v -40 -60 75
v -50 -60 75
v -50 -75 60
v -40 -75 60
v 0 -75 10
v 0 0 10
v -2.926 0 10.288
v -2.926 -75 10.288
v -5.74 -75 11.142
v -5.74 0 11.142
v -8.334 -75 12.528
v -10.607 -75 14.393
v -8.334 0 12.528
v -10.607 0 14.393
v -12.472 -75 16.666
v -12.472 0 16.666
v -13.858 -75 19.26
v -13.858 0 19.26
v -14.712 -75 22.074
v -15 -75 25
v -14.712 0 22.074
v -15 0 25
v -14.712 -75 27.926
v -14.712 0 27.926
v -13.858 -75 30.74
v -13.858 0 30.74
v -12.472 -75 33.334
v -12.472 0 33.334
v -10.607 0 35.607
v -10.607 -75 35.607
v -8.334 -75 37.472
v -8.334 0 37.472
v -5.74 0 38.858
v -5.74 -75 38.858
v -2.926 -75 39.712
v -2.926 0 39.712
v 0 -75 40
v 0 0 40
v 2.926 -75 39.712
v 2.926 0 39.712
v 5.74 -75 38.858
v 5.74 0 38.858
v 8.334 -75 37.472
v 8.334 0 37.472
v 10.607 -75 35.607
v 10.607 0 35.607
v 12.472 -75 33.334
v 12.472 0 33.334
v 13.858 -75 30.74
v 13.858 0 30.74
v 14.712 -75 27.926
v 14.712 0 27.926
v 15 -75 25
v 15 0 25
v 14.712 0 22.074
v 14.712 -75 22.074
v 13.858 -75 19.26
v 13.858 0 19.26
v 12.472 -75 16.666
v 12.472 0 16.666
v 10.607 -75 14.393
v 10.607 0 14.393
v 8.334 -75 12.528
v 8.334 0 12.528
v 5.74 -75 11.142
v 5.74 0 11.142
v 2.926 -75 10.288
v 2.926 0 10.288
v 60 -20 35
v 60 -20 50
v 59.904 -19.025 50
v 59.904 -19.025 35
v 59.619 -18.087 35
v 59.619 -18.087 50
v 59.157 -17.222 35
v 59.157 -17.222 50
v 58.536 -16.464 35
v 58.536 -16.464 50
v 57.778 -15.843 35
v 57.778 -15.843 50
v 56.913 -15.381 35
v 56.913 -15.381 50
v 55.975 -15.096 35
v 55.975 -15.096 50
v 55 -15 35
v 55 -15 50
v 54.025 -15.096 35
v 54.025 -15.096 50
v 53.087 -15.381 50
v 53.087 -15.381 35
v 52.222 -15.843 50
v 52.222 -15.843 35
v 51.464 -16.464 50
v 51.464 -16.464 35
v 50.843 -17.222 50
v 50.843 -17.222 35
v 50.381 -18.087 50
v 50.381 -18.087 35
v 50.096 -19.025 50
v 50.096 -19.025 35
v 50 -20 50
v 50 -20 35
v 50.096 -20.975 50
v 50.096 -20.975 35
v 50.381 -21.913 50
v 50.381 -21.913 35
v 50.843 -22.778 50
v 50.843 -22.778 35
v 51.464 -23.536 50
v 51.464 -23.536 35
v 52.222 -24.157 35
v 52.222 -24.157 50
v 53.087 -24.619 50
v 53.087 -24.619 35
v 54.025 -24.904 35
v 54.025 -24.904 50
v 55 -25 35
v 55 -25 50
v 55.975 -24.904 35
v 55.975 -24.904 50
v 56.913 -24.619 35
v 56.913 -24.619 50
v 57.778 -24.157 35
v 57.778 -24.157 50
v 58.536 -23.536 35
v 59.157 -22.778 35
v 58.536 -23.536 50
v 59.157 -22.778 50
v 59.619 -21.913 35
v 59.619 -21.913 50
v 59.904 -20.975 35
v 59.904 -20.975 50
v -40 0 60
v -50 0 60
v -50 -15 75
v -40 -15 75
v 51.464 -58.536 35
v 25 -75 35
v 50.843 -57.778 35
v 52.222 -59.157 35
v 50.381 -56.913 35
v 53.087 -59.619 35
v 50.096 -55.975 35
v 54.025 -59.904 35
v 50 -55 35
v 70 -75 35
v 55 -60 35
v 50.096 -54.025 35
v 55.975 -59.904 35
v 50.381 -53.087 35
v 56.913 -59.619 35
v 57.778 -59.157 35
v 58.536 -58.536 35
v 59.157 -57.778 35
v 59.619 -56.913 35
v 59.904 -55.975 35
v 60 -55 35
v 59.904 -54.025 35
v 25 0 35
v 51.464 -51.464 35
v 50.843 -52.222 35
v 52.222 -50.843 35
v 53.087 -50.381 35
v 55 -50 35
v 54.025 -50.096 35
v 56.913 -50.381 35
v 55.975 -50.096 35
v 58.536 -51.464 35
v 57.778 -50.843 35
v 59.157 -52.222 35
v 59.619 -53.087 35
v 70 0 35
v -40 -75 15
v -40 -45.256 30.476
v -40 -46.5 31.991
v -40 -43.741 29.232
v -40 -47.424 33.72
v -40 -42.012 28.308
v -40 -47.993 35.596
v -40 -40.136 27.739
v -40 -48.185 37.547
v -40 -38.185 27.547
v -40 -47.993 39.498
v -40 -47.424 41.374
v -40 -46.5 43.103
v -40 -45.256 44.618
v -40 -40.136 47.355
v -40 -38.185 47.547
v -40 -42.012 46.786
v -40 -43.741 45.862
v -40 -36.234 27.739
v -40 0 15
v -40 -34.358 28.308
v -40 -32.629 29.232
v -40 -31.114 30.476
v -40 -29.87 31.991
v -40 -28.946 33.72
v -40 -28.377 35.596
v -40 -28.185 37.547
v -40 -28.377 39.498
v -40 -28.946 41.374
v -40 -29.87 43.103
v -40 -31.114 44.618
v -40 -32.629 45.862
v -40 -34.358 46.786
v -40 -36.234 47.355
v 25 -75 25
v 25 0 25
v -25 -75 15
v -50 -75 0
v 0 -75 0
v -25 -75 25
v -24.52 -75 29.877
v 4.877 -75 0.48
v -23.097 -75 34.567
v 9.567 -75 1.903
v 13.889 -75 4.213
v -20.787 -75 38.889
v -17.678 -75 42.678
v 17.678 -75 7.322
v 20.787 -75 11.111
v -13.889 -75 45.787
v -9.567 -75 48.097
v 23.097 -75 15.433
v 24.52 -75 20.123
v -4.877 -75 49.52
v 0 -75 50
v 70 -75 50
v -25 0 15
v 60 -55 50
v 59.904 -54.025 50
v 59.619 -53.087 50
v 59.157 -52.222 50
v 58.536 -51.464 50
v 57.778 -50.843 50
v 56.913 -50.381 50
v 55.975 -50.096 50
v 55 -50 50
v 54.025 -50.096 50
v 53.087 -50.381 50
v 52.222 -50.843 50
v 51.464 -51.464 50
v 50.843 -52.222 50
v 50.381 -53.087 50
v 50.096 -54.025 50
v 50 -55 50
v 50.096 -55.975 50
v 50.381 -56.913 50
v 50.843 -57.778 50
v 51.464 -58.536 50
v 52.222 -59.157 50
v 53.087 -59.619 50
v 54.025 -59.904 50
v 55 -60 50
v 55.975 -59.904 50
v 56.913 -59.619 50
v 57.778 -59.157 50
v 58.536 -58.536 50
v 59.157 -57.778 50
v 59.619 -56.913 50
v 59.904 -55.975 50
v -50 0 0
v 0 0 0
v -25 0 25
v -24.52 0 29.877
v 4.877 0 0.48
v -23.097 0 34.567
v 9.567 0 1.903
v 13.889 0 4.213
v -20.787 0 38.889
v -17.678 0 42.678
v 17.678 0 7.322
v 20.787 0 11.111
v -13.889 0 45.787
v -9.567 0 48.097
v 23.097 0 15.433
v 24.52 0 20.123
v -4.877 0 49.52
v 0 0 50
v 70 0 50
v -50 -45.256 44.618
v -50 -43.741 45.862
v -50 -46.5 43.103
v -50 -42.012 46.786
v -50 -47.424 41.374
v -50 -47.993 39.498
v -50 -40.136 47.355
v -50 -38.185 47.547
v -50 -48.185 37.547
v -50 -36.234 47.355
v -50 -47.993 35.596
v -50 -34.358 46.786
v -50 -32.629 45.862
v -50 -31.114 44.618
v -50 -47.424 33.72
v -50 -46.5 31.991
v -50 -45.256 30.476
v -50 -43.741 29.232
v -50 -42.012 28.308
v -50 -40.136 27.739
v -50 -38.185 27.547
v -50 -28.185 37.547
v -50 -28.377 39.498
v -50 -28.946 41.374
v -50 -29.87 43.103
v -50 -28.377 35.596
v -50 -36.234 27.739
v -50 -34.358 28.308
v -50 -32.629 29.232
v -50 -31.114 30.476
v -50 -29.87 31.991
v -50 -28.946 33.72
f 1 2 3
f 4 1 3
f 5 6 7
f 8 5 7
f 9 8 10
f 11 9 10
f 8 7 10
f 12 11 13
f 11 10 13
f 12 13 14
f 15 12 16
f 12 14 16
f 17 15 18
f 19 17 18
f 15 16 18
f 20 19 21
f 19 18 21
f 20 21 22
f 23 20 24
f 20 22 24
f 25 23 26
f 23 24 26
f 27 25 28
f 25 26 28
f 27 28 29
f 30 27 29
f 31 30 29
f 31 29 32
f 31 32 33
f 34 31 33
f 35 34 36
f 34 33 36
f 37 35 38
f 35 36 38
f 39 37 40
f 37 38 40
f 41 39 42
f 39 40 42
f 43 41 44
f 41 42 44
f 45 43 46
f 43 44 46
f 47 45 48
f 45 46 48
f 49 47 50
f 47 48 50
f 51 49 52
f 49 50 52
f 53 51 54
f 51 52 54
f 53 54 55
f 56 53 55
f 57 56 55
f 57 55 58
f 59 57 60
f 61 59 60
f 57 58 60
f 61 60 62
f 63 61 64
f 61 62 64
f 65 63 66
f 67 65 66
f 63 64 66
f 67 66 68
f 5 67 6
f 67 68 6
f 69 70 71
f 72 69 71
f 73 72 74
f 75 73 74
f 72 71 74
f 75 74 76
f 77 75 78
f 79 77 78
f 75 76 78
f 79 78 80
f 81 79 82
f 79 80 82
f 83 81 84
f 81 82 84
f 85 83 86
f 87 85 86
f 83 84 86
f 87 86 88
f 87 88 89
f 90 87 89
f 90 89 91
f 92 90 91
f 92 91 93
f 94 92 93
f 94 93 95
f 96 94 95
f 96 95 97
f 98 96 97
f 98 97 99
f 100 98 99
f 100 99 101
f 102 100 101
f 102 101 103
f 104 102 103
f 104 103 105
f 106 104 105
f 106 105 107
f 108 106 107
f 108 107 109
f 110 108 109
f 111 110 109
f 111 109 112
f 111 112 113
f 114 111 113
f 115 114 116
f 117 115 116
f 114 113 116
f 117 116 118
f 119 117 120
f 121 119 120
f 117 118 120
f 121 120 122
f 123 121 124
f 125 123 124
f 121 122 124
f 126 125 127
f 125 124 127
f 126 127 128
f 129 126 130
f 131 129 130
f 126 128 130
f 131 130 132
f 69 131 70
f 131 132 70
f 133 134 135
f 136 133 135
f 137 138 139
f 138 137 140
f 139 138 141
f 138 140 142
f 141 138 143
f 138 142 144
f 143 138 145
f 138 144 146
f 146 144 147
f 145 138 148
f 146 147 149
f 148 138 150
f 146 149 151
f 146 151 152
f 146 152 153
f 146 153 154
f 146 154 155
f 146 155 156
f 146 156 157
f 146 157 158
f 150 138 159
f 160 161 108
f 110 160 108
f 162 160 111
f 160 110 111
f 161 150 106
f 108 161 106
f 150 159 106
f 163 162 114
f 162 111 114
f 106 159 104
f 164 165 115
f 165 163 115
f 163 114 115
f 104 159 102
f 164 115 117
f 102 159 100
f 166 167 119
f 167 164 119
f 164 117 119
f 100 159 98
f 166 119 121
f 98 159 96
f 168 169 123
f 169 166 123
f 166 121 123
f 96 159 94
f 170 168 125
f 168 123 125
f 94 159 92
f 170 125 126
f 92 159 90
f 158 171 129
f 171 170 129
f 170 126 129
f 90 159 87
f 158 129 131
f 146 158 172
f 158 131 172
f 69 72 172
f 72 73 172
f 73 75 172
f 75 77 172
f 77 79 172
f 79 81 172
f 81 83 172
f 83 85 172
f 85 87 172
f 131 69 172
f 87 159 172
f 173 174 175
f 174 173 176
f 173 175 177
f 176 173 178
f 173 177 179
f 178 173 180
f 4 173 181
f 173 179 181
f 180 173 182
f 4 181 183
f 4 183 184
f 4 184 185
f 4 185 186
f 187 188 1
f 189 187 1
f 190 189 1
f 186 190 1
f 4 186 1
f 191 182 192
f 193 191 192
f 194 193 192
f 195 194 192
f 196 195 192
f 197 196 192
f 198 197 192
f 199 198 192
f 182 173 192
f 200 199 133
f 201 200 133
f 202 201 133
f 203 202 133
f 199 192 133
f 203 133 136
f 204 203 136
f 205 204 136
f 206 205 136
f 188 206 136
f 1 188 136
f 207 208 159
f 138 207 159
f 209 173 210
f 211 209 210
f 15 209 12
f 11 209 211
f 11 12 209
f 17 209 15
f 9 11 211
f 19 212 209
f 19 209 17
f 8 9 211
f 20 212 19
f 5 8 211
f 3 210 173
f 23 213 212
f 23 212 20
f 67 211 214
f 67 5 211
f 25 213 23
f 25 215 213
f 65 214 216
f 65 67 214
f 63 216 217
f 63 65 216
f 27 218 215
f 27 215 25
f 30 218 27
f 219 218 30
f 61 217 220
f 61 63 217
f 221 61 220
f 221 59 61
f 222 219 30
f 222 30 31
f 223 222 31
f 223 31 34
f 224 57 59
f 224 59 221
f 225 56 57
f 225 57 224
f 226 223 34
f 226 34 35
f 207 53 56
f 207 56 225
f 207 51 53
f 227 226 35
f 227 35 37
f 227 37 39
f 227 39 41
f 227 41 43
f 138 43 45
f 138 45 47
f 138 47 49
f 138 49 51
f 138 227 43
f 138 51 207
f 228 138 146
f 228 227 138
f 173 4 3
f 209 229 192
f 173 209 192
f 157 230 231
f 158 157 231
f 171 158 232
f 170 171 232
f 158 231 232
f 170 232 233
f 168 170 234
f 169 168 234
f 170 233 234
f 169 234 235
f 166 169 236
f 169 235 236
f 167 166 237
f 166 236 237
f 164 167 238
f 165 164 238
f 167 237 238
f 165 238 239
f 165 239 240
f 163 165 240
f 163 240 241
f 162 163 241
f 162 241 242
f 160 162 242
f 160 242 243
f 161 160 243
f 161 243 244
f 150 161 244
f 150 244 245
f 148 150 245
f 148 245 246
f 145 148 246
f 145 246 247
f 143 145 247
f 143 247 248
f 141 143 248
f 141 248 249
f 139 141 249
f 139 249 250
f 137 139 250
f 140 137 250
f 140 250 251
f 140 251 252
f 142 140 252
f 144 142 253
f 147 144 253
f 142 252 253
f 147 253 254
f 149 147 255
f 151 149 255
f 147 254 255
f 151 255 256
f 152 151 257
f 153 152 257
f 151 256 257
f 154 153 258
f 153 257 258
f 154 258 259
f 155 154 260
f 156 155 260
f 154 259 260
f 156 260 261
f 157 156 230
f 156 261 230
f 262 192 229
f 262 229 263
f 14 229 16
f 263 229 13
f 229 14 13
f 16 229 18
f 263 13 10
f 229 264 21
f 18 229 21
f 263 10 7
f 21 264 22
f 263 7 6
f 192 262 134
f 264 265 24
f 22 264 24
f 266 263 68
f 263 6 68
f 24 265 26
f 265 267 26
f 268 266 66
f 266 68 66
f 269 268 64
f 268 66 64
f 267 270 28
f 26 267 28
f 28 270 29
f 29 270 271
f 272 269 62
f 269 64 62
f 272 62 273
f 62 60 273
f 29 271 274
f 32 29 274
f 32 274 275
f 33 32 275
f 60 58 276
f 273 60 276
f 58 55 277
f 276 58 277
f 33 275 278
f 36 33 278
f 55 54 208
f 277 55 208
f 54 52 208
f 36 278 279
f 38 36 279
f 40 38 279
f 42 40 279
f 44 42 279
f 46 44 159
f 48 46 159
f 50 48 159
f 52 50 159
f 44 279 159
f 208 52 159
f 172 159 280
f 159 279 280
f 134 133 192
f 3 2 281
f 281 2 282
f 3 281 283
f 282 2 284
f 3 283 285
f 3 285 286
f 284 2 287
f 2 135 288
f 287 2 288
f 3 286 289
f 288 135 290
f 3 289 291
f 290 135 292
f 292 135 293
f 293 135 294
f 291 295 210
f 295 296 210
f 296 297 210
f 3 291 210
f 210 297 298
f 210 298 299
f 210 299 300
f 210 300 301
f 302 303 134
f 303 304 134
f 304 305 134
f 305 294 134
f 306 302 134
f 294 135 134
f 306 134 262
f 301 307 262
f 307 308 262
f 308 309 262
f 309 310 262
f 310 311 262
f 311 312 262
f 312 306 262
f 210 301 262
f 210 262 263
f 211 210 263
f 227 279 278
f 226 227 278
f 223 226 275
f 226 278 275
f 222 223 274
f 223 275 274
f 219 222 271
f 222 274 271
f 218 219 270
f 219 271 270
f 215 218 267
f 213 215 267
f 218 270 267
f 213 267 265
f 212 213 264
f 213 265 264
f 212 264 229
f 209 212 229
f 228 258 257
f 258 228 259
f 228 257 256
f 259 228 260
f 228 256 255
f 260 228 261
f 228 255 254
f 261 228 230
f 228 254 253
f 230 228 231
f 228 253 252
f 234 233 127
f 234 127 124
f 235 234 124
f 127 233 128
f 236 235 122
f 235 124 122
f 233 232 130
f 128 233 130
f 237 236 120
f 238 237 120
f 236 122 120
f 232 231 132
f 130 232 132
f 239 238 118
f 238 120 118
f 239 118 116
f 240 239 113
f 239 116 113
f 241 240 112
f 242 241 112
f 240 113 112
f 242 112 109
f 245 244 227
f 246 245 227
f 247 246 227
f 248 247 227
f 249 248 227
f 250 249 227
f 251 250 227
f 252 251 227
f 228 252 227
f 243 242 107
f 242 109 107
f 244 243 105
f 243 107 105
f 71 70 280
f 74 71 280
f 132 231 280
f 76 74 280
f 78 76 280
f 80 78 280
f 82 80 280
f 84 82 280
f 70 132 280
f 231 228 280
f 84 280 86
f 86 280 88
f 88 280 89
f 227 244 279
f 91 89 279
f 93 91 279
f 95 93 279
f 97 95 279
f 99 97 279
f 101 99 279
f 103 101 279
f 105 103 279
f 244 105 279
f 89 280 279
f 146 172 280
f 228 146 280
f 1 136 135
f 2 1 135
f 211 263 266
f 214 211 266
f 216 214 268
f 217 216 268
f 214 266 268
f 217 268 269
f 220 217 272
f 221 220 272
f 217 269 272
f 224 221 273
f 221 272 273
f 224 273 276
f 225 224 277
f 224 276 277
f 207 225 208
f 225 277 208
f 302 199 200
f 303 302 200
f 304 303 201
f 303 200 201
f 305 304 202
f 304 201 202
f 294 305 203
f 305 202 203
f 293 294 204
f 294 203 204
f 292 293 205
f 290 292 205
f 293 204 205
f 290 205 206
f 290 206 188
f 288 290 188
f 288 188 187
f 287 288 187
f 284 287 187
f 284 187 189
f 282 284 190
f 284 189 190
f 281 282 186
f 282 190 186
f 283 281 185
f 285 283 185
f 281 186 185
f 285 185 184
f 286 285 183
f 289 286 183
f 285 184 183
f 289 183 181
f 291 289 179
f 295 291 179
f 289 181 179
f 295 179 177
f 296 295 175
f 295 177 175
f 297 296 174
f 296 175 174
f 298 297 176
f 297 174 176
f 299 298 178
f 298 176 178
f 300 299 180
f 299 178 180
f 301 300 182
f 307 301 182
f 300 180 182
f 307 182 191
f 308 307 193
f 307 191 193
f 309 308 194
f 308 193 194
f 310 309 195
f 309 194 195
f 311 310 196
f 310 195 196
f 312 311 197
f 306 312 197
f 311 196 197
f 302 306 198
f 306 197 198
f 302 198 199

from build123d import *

# Parameters (mm, degrees)
F1_DEPTH = 75
F2_R     = 5
F3_DEPTH = 25
F5_DEPTH = 25
F7_R     = 10
F8_DEPTH = 10


with BuildPart() as f1:
    # F0 (on Front) → F1 (new body)
    with BuildSketch(Plane.XZ):
        with BuildLine():
            Line((-50, 0), (0, 0))
            ThreePointArc((0, 0), (17.67767, 7.32233), (25, 25))
            Line((25, 25), (25, 35))
            Line((25, 35), (70, 35))
            Line((70, 35), (70, 50))
            Line((70, 50), (0, 50))
            ThreePointArc((0, 50), (-17.67767, 42.67767), (-25, 25))
            Line((-25, 25), (-25, 15))
            Line((-25, 15), (-40, 15))
            Line((-40, 15), (-40, 75))
            Line((-40, 75), (-50, 75))
            Line((-50, 75), (-50, 0))
        make_face()
        with BuildLine():
            ThreePointArc((0, 10), (-10.606602, 35.606602), (15, 25))
            ThreePointArc((15, 25), (10.606602, 14.393398), (0, 10))
        make_face(mode=Mode.SUBTRACT)
    extrude(amount=F1_DEPTH)

    # F2 (on face) → F3 (cut)
    with BuildSketch(Plane.XY.offset(50)):
        with Locations((55, -20)):
            Circle(F2_R)
        with Locations((55, -55)):
            Circle(F2_R)
    extrude(amount=-F3_DEPTH, mode=Mode.SUBTRACT)

    # F4 (on face) → F5 (cut)
    with BuildSketch(Plane(origin=(-50, 0, 0), x_dir=(0, -1, 0), z_dir=(-1, 0, 0))):
        Polygon((0, 60), (15, 75), (0, 75), align=None)
        Polygon((75, 75), (60, 75), (75, 60), align=None)
    extrude(amount=-F5_DEPTH, mode=Mode.SUBTRACT)

    # F7 (on face) → F8 (cut)
    with BuildSketch(Plane.YZ.offset(-40)):
        with Locations((-38.184846, 37.546992)):
            Circle(F7_R)
    extrude(amount=-F8_DEPTH, mode=Mode.SUBTRACT)


solid = f1.part
